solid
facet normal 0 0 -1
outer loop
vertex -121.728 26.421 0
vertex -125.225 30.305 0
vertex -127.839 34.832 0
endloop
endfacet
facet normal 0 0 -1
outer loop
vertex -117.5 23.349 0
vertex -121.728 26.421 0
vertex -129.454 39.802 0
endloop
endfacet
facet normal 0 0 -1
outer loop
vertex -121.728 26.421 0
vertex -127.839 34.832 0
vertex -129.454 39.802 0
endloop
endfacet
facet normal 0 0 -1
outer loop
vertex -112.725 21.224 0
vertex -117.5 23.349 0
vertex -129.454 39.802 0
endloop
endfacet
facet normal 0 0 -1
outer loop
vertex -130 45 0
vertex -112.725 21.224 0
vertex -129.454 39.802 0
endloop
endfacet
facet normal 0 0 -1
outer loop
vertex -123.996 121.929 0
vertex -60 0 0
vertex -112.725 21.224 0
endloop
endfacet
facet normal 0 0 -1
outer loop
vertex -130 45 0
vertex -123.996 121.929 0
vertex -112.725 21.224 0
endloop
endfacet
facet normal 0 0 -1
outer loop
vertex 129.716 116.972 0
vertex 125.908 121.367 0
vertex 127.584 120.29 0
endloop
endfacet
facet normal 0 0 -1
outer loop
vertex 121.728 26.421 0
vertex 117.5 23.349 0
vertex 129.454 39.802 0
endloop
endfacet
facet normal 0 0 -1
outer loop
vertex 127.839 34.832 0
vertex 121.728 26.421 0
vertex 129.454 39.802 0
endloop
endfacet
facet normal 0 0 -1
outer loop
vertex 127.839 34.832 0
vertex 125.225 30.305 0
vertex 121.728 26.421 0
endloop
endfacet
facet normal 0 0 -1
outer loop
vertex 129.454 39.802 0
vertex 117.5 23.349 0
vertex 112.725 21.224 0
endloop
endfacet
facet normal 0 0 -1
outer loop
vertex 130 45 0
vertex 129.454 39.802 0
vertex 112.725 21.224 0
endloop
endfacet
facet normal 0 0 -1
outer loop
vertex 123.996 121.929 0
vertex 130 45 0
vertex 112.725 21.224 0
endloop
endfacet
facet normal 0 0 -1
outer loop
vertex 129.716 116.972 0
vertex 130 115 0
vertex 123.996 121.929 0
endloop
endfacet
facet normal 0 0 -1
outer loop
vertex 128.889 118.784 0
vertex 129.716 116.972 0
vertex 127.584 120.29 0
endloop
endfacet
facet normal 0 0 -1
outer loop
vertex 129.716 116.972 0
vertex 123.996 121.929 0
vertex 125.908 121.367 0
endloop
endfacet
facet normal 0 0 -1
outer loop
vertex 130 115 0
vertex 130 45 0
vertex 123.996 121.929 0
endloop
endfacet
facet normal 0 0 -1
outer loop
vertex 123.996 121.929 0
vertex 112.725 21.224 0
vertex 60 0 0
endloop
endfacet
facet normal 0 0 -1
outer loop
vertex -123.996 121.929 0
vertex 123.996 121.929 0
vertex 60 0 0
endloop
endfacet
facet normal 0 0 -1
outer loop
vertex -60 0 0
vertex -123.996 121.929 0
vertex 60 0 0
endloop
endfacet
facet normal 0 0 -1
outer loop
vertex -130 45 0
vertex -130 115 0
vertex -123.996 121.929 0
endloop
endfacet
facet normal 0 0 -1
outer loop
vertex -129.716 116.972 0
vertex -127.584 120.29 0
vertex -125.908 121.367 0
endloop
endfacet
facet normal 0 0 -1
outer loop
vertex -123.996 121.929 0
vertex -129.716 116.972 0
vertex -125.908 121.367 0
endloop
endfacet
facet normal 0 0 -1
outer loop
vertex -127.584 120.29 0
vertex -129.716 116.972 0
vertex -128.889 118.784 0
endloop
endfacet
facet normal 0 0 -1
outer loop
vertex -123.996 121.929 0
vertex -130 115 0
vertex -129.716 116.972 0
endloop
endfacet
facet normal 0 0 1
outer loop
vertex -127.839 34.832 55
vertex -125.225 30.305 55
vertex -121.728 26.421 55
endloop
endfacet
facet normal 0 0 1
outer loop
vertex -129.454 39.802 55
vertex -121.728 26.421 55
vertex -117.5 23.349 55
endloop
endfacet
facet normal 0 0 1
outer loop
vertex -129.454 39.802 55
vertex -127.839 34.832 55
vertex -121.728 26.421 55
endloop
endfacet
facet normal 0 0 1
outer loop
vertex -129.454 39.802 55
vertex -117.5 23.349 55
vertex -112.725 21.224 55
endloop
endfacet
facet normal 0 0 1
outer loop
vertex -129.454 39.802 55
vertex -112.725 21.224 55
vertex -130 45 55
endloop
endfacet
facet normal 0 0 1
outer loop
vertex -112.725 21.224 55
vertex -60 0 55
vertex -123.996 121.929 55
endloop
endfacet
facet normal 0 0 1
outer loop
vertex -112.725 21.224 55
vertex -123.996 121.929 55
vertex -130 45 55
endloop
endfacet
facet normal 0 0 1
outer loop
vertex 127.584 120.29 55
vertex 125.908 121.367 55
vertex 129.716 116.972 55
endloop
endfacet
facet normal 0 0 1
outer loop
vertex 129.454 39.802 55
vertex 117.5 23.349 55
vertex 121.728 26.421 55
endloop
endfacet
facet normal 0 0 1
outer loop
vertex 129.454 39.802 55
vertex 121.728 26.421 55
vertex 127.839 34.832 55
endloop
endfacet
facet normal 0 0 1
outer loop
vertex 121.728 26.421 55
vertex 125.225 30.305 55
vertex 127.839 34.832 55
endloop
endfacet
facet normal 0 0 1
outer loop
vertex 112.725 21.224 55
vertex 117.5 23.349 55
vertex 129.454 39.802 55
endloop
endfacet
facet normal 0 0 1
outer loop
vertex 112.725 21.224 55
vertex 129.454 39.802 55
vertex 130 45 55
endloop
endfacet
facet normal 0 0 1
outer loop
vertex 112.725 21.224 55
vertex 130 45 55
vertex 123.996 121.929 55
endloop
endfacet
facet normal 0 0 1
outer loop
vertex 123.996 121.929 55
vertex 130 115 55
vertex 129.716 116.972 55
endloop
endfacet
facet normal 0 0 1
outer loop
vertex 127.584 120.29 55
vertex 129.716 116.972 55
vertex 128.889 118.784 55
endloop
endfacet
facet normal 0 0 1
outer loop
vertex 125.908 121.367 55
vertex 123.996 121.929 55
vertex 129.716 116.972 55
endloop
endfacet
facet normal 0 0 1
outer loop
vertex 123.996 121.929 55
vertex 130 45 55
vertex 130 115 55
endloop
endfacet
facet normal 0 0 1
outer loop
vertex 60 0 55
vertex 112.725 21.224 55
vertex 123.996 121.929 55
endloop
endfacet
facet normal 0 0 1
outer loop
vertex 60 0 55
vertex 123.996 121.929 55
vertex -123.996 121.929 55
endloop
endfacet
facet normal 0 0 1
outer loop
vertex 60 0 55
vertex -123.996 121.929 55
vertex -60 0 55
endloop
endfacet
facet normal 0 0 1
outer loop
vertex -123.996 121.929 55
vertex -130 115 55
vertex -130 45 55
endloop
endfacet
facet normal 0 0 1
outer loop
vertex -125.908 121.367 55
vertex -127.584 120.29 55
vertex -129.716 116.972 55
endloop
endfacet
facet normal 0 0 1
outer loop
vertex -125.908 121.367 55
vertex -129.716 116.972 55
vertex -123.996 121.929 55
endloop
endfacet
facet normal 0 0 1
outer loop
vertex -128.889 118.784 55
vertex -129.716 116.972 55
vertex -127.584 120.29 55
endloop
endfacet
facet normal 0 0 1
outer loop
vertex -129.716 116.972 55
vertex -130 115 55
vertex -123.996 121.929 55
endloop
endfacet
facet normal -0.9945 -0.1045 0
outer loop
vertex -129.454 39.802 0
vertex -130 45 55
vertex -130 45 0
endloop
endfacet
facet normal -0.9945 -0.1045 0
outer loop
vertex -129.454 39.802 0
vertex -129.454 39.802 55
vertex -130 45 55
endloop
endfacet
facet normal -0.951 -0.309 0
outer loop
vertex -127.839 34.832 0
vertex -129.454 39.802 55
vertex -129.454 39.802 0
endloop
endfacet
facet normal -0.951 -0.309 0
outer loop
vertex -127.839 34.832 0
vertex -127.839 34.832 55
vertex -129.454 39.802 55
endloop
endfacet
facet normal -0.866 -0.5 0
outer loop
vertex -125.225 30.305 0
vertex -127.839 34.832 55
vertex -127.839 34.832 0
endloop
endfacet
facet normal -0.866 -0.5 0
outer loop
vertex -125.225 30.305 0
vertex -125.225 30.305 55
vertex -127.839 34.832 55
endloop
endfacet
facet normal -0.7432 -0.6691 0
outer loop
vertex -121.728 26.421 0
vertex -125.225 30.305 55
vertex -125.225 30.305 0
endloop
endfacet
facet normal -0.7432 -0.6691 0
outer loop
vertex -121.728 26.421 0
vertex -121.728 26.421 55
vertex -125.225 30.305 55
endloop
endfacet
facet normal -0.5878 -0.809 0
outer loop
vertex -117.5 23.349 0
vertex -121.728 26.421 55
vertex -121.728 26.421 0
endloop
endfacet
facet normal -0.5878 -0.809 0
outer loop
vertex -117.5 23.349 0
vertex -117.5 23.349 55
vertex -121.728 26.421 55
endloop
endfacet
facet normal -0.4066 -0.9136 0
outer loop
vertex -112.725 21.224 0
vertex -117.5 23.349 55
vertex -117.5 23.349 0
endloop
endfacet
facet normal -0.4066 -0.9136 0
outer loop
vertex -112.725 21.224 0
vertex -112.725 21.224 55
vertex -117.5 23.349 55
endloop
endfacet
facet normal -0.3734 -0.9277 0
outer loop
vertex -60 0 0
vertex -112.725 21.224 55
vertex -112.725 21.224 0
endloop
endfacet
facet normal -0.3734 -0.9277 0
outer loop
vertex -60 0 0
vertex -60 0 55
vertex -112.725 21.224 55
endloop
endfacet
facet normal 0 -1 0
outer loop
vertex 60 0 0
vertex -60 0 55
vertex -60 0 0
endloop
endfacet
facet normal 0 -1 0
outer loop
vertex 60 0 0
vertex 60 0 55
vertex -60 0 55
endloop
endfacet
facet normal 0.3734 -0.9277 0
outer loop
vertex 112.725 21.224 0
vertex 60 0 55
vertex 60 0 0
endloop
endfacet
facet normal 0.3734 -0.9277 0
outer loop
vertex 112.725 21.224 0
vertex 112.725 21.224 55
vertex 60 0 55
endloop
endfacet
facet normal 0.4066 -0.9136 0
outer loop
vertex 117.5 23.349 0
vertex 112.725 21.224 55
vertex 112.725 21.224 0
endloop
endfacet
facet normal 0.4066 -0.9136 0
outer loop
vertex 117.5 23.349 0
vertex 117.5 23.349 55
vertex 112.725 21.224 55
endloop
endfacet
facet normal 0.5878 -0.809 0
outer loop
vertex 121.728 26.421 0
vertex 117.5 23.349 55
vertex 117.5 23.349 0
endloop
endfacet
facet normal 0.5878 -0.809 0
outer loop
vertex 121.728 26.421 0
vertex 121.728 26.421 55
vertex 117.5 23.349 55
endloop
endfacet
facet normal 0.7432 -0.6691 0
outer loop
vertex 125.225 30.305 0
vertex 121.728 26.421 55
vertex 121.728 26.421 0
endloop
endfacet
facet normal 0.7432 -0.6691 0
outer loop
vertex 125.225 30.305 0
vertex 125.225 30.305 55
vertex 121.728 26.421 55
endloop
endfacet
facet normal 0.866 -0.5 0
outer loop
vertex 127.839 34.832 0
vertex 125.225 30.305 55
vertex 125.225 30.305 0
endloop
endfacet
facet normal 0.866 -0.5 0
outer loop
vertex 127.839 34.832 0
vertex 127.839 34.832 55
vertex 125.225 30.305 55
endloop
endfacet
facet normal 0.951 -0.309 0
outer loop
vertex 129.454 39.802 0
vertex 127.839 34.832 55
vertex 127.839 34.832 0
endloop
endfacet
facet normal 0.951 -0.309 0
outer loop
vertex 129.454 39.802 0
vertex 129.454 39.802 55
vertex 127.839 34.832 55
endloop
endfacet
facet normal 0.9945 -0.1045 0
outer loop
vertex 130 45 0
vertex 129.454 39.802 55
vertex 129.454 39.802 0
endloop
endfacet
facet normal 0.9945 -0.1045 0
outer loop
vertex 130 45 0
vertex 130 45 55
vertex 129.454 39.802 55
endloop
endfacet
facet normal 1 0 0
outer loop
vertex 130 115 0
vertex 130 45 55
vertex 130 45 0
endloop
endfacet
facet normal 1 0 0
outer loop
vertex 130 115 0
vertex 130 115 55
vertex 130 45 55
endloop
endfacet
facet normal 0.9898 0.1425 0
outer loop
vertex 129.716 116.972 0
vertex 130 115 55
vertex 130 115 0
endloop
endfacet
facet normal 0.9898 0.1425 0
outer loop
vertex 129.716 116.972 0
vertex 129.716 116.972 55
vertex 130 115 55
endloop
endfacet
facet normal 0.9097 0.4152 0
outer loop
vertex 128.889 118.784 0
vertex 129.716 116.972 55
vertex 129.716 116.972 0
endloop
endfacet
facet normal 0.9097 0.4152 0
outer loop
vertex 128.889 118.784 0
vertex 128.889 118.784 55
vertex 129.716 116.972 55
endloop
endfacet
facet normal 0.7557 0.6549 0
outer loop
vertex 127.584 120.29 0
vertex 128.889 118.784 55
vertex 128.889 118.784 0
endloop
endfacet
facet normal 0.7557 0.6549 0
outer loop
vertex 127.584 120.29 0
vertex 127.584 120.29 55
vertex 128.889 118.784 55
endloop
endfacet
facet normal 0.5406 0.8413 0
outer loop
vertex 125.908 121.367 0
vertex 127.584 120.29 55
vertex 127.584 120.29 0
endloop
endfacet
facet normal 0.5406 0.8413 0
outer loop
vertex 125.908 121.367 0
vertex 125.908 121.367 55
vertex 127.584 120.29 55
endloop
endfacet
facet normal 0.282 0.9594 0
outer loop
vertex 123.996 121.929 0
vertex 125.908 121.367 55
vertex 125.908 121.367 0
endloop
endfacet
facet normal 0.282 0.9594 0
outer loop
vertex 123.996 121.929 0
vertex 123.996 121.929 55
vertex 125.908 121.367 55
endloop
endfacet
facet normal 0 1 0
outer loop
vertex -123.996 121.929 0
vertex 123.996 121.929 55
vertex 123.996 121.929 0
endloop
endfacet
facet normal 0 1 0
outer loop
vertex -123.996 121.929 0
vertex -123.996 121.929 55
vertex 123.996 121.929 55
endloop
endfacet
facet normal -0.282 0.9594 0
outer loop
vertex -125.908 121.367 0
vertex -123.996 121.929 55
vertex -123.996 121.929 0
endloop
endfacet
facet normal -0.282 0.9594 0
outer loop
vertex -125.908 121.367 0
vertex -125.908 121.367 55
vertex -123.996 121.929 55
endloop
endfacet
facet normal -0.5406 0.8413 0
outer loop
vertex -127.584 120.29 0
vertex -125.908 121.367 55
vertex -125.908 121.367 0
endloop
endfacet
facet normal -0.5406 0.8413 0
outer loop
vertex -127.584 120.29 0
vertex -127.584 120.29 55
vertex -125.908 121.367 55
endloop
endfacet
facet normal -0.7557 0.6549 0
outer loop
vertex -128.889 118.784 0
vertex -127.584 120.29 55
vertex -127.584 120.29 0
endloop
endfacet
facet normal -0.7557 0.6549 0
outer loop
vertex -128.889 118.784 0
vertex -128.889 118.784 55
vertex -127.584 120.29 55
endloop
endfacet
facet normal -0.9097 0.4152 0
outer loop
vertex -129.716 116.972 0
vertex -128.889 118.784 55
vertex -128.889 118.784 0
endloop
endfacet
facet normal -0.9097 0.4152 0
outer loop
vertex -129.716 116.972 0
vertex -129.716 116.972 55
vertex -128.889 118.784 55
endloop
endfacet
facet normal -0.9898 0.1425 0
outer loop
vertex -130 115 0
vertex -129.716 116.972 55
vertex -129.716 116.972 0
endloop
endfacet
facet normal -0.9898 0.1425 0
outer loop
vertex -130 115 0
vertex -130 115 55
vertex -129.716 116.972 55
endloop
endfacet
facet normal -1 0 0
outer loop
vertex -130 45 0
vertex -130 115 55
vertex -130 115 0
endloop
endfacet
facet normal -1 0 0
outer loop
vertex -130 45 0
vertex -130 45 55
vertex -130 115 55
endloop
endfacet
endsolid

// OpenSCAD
hooverDummy();

module hooverDummy(){
  headWidth=305;
  headHght=55;
  maxBodyWdth=120;
  
  //head
  linear_extrude(headHght) hull(){
    translate([-105,45]) circle(25);
    translate([105,45]) circle(25);
    translate([-123,115]) circle(7);
    translate([123,115]) circle(7);
    translate([-maxBodyWdth/2,0]) square([maxBodyWdth,10]);
  }
  
}
